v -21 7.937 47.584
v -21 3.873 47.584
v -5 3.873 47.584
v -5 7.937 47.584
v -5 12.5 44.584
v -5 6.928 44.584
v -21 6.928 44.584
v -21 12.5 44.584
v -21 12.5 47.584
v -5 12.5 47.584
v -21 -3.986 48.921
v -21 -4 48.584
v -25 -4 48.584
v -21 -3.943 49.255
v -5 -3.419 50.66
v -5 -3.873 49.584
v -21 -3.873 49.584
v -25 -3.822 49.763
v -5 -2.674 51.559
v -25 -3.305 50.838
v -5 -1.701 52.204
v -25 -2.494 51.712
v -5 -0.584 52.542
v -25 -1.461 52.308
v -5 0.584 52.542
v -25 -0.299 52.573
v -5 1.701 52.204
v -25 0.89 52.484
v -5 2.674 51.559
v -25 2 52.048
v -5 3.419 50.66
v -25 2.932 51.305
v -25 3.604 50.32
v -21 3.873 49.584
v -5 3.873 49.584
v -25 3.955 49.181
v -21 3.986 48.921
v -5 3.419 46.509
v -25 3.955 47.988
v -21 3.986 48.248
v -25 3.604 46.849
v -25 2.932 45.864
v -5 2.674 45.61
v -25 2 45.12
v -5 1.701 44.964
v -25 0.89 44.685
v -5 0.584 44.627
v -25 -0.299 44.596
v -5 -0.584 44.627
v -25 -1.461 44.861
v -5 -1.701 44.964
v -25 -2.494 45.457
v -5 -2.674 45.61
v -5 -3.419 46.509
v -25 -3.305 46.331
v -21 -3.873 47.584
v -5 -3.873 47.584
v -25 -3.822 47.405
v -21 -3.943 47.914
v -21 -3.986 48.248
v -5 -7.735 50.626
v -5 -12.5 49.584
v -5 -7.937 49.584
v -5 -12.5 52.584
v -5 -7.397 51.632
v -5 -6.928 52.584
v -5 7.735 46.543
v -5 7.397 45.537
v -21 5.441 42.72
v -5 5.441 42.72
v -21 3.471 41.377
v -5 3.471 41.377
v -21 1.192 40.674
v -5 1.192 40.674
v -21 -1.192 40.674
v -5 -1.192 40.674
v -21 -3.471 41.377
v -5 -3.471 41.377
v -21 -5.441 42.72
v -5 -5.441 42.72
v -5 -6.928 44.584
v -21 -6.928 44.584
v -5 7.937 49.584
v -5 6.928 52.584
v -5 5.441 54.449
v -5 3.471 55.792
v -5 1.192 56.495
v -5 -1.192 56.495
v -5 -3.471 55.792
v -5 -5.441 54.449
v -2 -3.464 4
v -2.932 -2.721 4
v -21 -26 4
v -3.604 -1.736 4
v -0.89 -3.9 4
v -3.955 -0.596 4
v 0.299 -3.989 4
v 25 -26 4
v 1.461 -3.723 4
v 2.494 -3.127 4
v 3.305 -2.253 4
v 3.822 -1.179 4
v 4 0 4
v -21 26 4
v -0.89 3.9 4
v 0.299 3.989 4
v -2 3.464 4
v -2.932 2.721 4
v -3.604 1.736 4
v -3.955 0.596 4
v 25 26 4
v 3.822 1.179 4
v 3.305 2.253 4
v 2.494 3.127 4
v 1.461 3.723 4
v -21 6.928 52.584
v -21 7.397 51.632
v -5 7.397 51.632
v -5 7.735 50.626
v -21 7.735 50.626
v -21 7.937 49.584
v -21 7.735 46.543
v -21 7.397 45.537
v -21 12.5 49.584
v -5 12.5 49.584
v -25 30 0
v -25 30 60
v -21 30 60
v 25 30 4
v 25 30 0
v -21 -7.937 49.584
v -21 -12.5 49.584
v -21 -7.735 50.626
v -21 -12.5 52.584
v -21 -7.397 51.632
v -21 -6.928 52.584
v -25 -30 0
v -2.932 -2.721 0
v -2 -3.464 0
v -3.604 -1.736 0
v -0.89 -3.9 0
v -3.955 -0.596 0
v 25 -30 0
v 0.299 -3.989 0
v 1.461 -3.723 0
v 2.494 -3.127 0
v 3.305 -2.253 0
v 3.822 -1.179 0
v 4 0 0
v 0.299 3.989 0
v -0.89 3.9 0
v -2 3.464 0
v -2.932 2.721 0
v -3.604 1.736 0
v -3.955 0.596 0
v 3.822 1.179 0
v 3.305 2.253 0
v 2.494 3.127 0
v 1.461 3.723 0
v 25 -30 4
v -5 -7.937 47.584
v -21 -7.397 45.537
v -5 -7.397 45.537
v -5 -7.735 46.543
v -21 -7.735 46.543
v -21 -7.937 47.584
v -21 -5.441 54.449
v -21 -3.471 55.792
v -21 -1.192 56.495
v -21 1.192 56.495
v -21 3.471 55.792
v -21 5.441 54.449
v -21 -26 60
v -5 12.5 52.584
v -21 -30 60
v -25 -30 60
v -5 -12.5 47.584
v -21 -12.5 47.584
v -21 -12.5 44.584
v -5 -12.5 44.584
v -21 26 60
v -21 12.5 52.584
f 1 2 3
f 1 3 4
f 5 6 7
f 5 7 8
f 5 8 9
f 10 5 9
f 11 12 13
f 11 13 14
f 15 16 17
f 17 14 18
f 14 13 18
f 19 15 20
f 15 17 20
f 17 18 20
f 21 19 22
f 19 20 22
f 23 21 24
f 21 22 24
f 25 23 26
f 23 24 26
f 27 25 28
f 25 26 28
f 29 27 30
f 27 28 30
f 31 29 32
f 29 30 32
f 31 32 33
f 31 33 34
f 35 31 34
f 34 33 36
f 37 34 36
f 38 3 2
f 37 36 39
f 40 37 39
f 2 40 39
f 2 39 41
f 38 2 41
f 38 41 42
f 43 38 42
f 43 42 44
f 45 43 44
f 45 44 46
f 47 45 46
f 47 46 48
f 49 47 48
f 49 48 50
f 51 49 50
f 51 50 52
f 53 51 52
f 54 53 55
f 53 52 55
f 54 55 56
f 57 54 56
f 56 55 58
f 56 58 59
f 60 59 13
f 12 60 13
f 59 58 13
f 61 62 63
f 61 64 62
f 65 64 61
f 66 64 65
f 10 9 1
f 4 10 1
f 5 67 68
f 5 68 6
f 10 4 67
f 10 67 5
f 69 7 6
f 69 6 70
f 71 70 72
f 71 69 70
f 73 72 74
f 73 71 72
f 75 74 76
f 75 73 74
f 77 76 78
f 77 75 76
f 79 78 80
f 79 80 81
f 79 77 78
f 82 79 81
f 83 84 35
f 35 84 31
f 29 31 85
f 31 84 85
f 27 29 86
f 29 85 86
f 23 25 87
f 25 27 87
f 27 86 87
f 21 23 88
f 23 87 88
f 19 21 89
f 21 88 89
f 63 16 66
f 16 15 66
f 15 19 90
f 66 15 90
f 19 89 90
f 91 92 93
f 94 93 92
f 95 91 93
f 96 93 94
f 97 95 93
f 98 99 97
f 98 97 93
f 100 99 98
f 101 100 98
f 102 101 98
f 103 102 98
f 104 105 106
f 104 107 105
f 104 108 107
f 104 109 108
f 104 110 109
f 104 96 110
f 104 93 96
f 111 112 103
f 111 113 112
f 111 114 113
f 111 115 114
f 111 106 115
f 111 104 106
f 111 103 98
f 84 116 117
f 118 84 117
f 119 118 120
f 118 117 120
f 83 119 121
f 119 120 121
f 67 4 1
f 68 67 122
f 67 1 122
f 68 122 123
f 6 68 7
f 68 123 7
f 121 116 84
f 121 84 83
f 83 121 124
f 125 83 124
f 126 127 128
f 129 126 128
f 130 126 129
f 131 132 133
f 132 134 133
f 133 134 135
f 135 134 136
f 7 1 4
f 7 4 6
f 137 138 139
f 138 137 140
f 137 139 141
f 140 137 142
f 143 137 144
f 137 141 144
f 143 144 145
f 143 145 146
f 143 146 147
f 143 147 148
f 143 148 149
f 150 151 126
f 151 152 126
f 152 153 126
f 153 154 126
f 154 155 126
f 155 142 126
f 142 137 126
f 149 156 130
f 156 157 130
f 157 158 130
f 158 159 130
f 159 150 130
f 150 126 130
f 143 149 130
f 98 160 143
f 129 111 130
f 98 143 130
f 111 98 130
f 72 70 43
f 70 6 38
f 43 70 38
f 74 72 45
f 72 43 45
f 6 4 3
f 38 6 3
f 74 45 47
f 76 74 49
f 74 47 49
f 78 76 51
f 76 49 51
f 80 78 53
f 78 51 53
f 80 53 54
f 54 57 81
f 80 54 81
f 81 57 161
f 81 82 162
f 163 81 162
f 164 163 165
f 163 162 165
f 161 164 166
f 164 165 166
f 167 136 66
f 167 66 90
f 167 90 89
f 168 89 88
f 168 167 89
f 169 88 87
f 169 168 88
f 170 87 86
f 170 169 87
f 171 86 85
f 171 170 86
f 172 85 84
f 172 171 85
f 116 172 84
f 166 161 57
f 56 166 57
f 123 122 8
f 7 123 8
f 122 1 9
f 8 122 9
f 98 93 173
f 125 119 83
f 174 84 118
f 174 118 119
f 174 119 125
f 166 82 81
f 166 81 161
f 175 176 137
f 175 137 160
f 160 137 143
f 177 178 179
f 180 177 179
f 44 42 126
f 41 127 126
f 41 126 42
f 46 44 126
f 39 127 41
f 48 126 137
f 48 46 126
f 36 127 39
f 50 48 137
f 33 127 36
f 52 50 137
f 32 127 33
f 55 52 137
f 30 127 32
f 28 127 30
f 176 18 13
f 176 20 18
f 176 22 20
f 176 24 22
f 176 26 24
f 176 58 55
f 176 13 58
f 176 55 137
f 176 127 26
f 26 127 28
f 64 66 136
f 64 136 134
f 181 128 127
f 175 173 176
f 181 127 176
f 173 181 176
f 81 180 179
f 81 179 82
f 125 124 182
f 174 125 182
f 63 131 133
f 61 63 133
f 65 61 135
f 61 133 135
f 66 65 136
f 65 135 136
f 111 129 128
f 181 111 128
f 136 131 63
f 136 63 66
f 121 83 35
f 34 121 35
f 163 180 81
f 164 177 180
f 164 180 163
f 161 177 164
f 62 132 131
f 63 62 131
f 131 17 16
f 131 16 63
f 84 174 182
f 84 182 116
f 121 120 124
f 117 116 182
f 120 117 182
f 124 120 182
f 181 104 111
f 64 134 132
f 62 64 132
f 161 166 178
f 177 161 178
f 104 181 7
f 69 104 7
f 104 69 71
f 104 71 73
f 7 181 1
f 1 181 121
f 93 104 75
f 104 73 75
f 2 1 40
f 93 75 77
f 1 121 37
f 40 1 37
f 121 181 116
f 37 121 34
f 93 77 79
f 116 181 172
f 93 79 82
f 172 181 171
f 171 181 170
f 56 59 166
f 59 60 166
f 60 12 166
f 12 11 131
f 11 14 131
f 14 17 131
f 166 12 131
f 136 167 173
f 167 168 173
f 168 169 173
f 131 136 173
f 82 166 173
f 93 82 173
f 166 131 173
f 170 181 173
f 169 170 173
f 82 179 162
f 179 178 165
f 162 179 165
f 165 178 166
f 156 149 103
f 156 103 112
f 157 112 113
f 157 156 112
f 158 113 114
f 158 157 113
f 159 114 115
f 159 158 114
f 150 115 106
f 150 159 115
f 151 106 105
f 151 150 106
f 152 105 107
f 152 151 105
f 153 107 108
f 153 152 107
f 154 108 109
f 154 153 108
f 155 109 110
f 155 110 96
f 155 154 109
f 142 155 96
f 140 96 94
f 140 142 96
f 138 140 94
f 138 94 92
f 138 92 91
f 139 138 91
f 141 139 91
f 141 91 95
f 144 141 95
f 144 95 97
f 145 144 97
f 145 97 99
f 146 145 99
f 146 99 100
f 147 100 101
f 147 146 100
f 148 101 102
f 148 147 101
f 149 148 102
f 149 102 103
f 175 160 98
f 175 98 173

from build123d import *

# Parameters (mm, degrees)
F0_W      = 50
F0_H      = 60
F0_R      = 4
F1_DEPTH  = 4
F2_W      = 60
F2_H      = 60
F3_DEPTH  = 4
F5_DEPTH  = 4
F6_R      = 8
F6_R_2    = 4
F7_DEPTH  = 20
F8_DEPTH  = 50.001
F10_DEPTH = 46.001
F11_DEPTH = 16


# Not quite as in the source:
# - a pattern or mirror of a feature is missing from the dataset's text; its kind, count and spacing are read off the source's solid


with BuildPart() as f1:
    # F0 (on Top) → F1 (new body)
    with BuildSketch(Plane.XY):
        Rectangle(F0_W, F0_H)
        Circle(F0_R, mode=Mode.SUBTRACT)
    extrude(amount=F1_DEPTH)

    # F2 (on face) → F3 (join)
    with BuildSketch(Plane(origin=(-25, 0, 0), x_dir=(0, -1, 0), z_dir=(-1, 0, 0))):
        with Locations((0, 30)):
            Rectangle(F2_W, F2_H)
    extrude(amount=-F3_DEPTH)

    # F4 (on face) → F5 (join)
    with BuildSketch(Plane.XZ.offset(30)):
        Polygon((-21, 60), (-25, 60), (-25, 0), (25, 0), (25, 4), align=None)
    f5 = extrude(amount=-F5_DEPTH)

    # F5_copies: F5 across plane
    add(f5.mirror(Plane.ZX))

    # F6 (on face) → F7 (join)
    with BuildSketch(Plane(origin=(-25, 0, 0), x_dir=(0, -1, 0), z_dir=(-1, 0, 0))):
        with Locations((0, 48.5843531787)):
            Circle(F6_R)
        with Locations((0, 48.5843531787)):
            Circle(F6_R_2, mode=Mode.SUBTRACT)
    extrude(amount=-F7_DEPTH)

    # F6 (on face) → F8 (cut, through all)
    with BuildSketch(Plane(origin=(-25, 0, 0), x_dir=(0, -1, 0), z_dir=(-1, 0, 0))):
        with Locations((0, 48.5843531787)):
            Circle(F6_R_2)
    extrude(amount=-F8_DEPTH, mode=Mode.SUBTRACT)

    # F9 (on face) → F10 (cut, through all)
    with BuildSketch(Plane.YZ.offset(-21)):
        Polygon((12.5, 44.5843531787), (12.5, 47.5843531787), (7.9372539332, 47.5843531787), (6.9282032303, 44.5843531787), align=None)
        Polygon((7.9372539332, 47.5843531787), (12.5, 47.5843531787), (12.5, 49.5843531787), (7.9372539332, 49.5843531787), (-7.9372539332, 49.5843531787), (-12.5, 49.5843531787), (-12.5, 47.5843531787), (-7.9372539332, 47.5843531787), align=None)
        Polygon((7.9372539332, 49.5843531787), (12.5, 49.5843531787), (12.5, 52.5843531787), (6.9282032303, 52.5843531787), align=None)
        Polygon((-6.9282032303, 44.5843531787), (-7.9372539332, 47.5843531787), (-12.5, 47.5843531787), (-12.5, 44.5843531787), align=None)
        Polygon((-12.5, 49.5843531787), (-7.9372539332, 49.5843531787), (-6.9282032303, 52.5843531787), (-12.5, 52.5843531787), align=None)
    extrude(amount=F10_DEPTH, mode=Mode.SUBTRACT)


with BuildPart() as f11:
    # F9 (on face) → F11 (new body)
    with BuildSketch(Plane.YZ.offset(-21)):
        with BuildLine():
            Line((-12.5, 49.5843531787), (-7.9372539332, 49.5843531787))
            ThreePointArc((-7.9372539332, 49.5843531787), (-7.582575695, 51.1347542904), (-6.9282032303, 52.5843531787))
            Line((-6.9282032303, 52.5843531787), (-12.5, 52.5843531787))
            Line((-12.5, 52.5843531787), (-12.5, 49.5843531787))
        make_face()
    extrude(amount=F11_DEPTH)


with BuildPart() as f11b:
    # F9 (on face) → F11, piece 2 (new body)
    with BuildSketch(Plane.YZ.offset(-21)):
        with BuildLine():
            ThreePointArc((-6.9282032303, 44.5843531787), (-7.582575695, 46.0339520671), (-7.9372539332, 47.5843531787))
            Line((-7.9372539332, 47.5843531787), (-12.5, 47.5843531787))
            Line((-12.5, 47.5843531787), (-12.5, 44.5843531787))
            Line((-12.5, 44.5843531787), (-6.9282032303, 44.5843531787))
        make_face()
    extrude(amount=F11_DEPTH)


with BuildPart() as f11c:
    # F9 (on face) → F11, piece 3 (new body)
    with BuildSketch(Plane.YZ.offset(-21)):
        with BuildLine():
            Line((7.9372539332, 49.5843531787), (12.5, 49.5843531787))
            Line((12.5, 49.5843531787), (12.5, 52.5843531787))
            Line((12.5, 52.5843531787), (6.9282032303, 52.5843531787))
            ThreePointArc((6.9282032303, 52.5843531787), (7.582575695, 51.1347542904), (7.9372539332, 49.5843531787))
        make_face()
    extrude(amount=F11_DEPTH)


with BuildPart() as f11d:
    # F9 (on face) → F11, piece 4 (new body)
    with BuildSketch(Plane.YZ.offset(-21)):
        with BuildLine():
            Line((12.5, 44.5843531787), (12.5, 47.5843531787))
            Line((12.5, 47.5843531787), (7.9372539332, 47.5843531787))
            ThreePointArc((7.9372539332, 47.5843531787), (7.582575695, 46.0339520671), (6.9282032303, 44.5843531787))
            Line((6.9282032303, 44.5843531787), (12.5, 44.5843531787))
        make_face()
    extrude(amount=F11_DEPTH)


solid = Compound([f1.part, f11.part, f11b.part, f11c.part, f11d.part])
